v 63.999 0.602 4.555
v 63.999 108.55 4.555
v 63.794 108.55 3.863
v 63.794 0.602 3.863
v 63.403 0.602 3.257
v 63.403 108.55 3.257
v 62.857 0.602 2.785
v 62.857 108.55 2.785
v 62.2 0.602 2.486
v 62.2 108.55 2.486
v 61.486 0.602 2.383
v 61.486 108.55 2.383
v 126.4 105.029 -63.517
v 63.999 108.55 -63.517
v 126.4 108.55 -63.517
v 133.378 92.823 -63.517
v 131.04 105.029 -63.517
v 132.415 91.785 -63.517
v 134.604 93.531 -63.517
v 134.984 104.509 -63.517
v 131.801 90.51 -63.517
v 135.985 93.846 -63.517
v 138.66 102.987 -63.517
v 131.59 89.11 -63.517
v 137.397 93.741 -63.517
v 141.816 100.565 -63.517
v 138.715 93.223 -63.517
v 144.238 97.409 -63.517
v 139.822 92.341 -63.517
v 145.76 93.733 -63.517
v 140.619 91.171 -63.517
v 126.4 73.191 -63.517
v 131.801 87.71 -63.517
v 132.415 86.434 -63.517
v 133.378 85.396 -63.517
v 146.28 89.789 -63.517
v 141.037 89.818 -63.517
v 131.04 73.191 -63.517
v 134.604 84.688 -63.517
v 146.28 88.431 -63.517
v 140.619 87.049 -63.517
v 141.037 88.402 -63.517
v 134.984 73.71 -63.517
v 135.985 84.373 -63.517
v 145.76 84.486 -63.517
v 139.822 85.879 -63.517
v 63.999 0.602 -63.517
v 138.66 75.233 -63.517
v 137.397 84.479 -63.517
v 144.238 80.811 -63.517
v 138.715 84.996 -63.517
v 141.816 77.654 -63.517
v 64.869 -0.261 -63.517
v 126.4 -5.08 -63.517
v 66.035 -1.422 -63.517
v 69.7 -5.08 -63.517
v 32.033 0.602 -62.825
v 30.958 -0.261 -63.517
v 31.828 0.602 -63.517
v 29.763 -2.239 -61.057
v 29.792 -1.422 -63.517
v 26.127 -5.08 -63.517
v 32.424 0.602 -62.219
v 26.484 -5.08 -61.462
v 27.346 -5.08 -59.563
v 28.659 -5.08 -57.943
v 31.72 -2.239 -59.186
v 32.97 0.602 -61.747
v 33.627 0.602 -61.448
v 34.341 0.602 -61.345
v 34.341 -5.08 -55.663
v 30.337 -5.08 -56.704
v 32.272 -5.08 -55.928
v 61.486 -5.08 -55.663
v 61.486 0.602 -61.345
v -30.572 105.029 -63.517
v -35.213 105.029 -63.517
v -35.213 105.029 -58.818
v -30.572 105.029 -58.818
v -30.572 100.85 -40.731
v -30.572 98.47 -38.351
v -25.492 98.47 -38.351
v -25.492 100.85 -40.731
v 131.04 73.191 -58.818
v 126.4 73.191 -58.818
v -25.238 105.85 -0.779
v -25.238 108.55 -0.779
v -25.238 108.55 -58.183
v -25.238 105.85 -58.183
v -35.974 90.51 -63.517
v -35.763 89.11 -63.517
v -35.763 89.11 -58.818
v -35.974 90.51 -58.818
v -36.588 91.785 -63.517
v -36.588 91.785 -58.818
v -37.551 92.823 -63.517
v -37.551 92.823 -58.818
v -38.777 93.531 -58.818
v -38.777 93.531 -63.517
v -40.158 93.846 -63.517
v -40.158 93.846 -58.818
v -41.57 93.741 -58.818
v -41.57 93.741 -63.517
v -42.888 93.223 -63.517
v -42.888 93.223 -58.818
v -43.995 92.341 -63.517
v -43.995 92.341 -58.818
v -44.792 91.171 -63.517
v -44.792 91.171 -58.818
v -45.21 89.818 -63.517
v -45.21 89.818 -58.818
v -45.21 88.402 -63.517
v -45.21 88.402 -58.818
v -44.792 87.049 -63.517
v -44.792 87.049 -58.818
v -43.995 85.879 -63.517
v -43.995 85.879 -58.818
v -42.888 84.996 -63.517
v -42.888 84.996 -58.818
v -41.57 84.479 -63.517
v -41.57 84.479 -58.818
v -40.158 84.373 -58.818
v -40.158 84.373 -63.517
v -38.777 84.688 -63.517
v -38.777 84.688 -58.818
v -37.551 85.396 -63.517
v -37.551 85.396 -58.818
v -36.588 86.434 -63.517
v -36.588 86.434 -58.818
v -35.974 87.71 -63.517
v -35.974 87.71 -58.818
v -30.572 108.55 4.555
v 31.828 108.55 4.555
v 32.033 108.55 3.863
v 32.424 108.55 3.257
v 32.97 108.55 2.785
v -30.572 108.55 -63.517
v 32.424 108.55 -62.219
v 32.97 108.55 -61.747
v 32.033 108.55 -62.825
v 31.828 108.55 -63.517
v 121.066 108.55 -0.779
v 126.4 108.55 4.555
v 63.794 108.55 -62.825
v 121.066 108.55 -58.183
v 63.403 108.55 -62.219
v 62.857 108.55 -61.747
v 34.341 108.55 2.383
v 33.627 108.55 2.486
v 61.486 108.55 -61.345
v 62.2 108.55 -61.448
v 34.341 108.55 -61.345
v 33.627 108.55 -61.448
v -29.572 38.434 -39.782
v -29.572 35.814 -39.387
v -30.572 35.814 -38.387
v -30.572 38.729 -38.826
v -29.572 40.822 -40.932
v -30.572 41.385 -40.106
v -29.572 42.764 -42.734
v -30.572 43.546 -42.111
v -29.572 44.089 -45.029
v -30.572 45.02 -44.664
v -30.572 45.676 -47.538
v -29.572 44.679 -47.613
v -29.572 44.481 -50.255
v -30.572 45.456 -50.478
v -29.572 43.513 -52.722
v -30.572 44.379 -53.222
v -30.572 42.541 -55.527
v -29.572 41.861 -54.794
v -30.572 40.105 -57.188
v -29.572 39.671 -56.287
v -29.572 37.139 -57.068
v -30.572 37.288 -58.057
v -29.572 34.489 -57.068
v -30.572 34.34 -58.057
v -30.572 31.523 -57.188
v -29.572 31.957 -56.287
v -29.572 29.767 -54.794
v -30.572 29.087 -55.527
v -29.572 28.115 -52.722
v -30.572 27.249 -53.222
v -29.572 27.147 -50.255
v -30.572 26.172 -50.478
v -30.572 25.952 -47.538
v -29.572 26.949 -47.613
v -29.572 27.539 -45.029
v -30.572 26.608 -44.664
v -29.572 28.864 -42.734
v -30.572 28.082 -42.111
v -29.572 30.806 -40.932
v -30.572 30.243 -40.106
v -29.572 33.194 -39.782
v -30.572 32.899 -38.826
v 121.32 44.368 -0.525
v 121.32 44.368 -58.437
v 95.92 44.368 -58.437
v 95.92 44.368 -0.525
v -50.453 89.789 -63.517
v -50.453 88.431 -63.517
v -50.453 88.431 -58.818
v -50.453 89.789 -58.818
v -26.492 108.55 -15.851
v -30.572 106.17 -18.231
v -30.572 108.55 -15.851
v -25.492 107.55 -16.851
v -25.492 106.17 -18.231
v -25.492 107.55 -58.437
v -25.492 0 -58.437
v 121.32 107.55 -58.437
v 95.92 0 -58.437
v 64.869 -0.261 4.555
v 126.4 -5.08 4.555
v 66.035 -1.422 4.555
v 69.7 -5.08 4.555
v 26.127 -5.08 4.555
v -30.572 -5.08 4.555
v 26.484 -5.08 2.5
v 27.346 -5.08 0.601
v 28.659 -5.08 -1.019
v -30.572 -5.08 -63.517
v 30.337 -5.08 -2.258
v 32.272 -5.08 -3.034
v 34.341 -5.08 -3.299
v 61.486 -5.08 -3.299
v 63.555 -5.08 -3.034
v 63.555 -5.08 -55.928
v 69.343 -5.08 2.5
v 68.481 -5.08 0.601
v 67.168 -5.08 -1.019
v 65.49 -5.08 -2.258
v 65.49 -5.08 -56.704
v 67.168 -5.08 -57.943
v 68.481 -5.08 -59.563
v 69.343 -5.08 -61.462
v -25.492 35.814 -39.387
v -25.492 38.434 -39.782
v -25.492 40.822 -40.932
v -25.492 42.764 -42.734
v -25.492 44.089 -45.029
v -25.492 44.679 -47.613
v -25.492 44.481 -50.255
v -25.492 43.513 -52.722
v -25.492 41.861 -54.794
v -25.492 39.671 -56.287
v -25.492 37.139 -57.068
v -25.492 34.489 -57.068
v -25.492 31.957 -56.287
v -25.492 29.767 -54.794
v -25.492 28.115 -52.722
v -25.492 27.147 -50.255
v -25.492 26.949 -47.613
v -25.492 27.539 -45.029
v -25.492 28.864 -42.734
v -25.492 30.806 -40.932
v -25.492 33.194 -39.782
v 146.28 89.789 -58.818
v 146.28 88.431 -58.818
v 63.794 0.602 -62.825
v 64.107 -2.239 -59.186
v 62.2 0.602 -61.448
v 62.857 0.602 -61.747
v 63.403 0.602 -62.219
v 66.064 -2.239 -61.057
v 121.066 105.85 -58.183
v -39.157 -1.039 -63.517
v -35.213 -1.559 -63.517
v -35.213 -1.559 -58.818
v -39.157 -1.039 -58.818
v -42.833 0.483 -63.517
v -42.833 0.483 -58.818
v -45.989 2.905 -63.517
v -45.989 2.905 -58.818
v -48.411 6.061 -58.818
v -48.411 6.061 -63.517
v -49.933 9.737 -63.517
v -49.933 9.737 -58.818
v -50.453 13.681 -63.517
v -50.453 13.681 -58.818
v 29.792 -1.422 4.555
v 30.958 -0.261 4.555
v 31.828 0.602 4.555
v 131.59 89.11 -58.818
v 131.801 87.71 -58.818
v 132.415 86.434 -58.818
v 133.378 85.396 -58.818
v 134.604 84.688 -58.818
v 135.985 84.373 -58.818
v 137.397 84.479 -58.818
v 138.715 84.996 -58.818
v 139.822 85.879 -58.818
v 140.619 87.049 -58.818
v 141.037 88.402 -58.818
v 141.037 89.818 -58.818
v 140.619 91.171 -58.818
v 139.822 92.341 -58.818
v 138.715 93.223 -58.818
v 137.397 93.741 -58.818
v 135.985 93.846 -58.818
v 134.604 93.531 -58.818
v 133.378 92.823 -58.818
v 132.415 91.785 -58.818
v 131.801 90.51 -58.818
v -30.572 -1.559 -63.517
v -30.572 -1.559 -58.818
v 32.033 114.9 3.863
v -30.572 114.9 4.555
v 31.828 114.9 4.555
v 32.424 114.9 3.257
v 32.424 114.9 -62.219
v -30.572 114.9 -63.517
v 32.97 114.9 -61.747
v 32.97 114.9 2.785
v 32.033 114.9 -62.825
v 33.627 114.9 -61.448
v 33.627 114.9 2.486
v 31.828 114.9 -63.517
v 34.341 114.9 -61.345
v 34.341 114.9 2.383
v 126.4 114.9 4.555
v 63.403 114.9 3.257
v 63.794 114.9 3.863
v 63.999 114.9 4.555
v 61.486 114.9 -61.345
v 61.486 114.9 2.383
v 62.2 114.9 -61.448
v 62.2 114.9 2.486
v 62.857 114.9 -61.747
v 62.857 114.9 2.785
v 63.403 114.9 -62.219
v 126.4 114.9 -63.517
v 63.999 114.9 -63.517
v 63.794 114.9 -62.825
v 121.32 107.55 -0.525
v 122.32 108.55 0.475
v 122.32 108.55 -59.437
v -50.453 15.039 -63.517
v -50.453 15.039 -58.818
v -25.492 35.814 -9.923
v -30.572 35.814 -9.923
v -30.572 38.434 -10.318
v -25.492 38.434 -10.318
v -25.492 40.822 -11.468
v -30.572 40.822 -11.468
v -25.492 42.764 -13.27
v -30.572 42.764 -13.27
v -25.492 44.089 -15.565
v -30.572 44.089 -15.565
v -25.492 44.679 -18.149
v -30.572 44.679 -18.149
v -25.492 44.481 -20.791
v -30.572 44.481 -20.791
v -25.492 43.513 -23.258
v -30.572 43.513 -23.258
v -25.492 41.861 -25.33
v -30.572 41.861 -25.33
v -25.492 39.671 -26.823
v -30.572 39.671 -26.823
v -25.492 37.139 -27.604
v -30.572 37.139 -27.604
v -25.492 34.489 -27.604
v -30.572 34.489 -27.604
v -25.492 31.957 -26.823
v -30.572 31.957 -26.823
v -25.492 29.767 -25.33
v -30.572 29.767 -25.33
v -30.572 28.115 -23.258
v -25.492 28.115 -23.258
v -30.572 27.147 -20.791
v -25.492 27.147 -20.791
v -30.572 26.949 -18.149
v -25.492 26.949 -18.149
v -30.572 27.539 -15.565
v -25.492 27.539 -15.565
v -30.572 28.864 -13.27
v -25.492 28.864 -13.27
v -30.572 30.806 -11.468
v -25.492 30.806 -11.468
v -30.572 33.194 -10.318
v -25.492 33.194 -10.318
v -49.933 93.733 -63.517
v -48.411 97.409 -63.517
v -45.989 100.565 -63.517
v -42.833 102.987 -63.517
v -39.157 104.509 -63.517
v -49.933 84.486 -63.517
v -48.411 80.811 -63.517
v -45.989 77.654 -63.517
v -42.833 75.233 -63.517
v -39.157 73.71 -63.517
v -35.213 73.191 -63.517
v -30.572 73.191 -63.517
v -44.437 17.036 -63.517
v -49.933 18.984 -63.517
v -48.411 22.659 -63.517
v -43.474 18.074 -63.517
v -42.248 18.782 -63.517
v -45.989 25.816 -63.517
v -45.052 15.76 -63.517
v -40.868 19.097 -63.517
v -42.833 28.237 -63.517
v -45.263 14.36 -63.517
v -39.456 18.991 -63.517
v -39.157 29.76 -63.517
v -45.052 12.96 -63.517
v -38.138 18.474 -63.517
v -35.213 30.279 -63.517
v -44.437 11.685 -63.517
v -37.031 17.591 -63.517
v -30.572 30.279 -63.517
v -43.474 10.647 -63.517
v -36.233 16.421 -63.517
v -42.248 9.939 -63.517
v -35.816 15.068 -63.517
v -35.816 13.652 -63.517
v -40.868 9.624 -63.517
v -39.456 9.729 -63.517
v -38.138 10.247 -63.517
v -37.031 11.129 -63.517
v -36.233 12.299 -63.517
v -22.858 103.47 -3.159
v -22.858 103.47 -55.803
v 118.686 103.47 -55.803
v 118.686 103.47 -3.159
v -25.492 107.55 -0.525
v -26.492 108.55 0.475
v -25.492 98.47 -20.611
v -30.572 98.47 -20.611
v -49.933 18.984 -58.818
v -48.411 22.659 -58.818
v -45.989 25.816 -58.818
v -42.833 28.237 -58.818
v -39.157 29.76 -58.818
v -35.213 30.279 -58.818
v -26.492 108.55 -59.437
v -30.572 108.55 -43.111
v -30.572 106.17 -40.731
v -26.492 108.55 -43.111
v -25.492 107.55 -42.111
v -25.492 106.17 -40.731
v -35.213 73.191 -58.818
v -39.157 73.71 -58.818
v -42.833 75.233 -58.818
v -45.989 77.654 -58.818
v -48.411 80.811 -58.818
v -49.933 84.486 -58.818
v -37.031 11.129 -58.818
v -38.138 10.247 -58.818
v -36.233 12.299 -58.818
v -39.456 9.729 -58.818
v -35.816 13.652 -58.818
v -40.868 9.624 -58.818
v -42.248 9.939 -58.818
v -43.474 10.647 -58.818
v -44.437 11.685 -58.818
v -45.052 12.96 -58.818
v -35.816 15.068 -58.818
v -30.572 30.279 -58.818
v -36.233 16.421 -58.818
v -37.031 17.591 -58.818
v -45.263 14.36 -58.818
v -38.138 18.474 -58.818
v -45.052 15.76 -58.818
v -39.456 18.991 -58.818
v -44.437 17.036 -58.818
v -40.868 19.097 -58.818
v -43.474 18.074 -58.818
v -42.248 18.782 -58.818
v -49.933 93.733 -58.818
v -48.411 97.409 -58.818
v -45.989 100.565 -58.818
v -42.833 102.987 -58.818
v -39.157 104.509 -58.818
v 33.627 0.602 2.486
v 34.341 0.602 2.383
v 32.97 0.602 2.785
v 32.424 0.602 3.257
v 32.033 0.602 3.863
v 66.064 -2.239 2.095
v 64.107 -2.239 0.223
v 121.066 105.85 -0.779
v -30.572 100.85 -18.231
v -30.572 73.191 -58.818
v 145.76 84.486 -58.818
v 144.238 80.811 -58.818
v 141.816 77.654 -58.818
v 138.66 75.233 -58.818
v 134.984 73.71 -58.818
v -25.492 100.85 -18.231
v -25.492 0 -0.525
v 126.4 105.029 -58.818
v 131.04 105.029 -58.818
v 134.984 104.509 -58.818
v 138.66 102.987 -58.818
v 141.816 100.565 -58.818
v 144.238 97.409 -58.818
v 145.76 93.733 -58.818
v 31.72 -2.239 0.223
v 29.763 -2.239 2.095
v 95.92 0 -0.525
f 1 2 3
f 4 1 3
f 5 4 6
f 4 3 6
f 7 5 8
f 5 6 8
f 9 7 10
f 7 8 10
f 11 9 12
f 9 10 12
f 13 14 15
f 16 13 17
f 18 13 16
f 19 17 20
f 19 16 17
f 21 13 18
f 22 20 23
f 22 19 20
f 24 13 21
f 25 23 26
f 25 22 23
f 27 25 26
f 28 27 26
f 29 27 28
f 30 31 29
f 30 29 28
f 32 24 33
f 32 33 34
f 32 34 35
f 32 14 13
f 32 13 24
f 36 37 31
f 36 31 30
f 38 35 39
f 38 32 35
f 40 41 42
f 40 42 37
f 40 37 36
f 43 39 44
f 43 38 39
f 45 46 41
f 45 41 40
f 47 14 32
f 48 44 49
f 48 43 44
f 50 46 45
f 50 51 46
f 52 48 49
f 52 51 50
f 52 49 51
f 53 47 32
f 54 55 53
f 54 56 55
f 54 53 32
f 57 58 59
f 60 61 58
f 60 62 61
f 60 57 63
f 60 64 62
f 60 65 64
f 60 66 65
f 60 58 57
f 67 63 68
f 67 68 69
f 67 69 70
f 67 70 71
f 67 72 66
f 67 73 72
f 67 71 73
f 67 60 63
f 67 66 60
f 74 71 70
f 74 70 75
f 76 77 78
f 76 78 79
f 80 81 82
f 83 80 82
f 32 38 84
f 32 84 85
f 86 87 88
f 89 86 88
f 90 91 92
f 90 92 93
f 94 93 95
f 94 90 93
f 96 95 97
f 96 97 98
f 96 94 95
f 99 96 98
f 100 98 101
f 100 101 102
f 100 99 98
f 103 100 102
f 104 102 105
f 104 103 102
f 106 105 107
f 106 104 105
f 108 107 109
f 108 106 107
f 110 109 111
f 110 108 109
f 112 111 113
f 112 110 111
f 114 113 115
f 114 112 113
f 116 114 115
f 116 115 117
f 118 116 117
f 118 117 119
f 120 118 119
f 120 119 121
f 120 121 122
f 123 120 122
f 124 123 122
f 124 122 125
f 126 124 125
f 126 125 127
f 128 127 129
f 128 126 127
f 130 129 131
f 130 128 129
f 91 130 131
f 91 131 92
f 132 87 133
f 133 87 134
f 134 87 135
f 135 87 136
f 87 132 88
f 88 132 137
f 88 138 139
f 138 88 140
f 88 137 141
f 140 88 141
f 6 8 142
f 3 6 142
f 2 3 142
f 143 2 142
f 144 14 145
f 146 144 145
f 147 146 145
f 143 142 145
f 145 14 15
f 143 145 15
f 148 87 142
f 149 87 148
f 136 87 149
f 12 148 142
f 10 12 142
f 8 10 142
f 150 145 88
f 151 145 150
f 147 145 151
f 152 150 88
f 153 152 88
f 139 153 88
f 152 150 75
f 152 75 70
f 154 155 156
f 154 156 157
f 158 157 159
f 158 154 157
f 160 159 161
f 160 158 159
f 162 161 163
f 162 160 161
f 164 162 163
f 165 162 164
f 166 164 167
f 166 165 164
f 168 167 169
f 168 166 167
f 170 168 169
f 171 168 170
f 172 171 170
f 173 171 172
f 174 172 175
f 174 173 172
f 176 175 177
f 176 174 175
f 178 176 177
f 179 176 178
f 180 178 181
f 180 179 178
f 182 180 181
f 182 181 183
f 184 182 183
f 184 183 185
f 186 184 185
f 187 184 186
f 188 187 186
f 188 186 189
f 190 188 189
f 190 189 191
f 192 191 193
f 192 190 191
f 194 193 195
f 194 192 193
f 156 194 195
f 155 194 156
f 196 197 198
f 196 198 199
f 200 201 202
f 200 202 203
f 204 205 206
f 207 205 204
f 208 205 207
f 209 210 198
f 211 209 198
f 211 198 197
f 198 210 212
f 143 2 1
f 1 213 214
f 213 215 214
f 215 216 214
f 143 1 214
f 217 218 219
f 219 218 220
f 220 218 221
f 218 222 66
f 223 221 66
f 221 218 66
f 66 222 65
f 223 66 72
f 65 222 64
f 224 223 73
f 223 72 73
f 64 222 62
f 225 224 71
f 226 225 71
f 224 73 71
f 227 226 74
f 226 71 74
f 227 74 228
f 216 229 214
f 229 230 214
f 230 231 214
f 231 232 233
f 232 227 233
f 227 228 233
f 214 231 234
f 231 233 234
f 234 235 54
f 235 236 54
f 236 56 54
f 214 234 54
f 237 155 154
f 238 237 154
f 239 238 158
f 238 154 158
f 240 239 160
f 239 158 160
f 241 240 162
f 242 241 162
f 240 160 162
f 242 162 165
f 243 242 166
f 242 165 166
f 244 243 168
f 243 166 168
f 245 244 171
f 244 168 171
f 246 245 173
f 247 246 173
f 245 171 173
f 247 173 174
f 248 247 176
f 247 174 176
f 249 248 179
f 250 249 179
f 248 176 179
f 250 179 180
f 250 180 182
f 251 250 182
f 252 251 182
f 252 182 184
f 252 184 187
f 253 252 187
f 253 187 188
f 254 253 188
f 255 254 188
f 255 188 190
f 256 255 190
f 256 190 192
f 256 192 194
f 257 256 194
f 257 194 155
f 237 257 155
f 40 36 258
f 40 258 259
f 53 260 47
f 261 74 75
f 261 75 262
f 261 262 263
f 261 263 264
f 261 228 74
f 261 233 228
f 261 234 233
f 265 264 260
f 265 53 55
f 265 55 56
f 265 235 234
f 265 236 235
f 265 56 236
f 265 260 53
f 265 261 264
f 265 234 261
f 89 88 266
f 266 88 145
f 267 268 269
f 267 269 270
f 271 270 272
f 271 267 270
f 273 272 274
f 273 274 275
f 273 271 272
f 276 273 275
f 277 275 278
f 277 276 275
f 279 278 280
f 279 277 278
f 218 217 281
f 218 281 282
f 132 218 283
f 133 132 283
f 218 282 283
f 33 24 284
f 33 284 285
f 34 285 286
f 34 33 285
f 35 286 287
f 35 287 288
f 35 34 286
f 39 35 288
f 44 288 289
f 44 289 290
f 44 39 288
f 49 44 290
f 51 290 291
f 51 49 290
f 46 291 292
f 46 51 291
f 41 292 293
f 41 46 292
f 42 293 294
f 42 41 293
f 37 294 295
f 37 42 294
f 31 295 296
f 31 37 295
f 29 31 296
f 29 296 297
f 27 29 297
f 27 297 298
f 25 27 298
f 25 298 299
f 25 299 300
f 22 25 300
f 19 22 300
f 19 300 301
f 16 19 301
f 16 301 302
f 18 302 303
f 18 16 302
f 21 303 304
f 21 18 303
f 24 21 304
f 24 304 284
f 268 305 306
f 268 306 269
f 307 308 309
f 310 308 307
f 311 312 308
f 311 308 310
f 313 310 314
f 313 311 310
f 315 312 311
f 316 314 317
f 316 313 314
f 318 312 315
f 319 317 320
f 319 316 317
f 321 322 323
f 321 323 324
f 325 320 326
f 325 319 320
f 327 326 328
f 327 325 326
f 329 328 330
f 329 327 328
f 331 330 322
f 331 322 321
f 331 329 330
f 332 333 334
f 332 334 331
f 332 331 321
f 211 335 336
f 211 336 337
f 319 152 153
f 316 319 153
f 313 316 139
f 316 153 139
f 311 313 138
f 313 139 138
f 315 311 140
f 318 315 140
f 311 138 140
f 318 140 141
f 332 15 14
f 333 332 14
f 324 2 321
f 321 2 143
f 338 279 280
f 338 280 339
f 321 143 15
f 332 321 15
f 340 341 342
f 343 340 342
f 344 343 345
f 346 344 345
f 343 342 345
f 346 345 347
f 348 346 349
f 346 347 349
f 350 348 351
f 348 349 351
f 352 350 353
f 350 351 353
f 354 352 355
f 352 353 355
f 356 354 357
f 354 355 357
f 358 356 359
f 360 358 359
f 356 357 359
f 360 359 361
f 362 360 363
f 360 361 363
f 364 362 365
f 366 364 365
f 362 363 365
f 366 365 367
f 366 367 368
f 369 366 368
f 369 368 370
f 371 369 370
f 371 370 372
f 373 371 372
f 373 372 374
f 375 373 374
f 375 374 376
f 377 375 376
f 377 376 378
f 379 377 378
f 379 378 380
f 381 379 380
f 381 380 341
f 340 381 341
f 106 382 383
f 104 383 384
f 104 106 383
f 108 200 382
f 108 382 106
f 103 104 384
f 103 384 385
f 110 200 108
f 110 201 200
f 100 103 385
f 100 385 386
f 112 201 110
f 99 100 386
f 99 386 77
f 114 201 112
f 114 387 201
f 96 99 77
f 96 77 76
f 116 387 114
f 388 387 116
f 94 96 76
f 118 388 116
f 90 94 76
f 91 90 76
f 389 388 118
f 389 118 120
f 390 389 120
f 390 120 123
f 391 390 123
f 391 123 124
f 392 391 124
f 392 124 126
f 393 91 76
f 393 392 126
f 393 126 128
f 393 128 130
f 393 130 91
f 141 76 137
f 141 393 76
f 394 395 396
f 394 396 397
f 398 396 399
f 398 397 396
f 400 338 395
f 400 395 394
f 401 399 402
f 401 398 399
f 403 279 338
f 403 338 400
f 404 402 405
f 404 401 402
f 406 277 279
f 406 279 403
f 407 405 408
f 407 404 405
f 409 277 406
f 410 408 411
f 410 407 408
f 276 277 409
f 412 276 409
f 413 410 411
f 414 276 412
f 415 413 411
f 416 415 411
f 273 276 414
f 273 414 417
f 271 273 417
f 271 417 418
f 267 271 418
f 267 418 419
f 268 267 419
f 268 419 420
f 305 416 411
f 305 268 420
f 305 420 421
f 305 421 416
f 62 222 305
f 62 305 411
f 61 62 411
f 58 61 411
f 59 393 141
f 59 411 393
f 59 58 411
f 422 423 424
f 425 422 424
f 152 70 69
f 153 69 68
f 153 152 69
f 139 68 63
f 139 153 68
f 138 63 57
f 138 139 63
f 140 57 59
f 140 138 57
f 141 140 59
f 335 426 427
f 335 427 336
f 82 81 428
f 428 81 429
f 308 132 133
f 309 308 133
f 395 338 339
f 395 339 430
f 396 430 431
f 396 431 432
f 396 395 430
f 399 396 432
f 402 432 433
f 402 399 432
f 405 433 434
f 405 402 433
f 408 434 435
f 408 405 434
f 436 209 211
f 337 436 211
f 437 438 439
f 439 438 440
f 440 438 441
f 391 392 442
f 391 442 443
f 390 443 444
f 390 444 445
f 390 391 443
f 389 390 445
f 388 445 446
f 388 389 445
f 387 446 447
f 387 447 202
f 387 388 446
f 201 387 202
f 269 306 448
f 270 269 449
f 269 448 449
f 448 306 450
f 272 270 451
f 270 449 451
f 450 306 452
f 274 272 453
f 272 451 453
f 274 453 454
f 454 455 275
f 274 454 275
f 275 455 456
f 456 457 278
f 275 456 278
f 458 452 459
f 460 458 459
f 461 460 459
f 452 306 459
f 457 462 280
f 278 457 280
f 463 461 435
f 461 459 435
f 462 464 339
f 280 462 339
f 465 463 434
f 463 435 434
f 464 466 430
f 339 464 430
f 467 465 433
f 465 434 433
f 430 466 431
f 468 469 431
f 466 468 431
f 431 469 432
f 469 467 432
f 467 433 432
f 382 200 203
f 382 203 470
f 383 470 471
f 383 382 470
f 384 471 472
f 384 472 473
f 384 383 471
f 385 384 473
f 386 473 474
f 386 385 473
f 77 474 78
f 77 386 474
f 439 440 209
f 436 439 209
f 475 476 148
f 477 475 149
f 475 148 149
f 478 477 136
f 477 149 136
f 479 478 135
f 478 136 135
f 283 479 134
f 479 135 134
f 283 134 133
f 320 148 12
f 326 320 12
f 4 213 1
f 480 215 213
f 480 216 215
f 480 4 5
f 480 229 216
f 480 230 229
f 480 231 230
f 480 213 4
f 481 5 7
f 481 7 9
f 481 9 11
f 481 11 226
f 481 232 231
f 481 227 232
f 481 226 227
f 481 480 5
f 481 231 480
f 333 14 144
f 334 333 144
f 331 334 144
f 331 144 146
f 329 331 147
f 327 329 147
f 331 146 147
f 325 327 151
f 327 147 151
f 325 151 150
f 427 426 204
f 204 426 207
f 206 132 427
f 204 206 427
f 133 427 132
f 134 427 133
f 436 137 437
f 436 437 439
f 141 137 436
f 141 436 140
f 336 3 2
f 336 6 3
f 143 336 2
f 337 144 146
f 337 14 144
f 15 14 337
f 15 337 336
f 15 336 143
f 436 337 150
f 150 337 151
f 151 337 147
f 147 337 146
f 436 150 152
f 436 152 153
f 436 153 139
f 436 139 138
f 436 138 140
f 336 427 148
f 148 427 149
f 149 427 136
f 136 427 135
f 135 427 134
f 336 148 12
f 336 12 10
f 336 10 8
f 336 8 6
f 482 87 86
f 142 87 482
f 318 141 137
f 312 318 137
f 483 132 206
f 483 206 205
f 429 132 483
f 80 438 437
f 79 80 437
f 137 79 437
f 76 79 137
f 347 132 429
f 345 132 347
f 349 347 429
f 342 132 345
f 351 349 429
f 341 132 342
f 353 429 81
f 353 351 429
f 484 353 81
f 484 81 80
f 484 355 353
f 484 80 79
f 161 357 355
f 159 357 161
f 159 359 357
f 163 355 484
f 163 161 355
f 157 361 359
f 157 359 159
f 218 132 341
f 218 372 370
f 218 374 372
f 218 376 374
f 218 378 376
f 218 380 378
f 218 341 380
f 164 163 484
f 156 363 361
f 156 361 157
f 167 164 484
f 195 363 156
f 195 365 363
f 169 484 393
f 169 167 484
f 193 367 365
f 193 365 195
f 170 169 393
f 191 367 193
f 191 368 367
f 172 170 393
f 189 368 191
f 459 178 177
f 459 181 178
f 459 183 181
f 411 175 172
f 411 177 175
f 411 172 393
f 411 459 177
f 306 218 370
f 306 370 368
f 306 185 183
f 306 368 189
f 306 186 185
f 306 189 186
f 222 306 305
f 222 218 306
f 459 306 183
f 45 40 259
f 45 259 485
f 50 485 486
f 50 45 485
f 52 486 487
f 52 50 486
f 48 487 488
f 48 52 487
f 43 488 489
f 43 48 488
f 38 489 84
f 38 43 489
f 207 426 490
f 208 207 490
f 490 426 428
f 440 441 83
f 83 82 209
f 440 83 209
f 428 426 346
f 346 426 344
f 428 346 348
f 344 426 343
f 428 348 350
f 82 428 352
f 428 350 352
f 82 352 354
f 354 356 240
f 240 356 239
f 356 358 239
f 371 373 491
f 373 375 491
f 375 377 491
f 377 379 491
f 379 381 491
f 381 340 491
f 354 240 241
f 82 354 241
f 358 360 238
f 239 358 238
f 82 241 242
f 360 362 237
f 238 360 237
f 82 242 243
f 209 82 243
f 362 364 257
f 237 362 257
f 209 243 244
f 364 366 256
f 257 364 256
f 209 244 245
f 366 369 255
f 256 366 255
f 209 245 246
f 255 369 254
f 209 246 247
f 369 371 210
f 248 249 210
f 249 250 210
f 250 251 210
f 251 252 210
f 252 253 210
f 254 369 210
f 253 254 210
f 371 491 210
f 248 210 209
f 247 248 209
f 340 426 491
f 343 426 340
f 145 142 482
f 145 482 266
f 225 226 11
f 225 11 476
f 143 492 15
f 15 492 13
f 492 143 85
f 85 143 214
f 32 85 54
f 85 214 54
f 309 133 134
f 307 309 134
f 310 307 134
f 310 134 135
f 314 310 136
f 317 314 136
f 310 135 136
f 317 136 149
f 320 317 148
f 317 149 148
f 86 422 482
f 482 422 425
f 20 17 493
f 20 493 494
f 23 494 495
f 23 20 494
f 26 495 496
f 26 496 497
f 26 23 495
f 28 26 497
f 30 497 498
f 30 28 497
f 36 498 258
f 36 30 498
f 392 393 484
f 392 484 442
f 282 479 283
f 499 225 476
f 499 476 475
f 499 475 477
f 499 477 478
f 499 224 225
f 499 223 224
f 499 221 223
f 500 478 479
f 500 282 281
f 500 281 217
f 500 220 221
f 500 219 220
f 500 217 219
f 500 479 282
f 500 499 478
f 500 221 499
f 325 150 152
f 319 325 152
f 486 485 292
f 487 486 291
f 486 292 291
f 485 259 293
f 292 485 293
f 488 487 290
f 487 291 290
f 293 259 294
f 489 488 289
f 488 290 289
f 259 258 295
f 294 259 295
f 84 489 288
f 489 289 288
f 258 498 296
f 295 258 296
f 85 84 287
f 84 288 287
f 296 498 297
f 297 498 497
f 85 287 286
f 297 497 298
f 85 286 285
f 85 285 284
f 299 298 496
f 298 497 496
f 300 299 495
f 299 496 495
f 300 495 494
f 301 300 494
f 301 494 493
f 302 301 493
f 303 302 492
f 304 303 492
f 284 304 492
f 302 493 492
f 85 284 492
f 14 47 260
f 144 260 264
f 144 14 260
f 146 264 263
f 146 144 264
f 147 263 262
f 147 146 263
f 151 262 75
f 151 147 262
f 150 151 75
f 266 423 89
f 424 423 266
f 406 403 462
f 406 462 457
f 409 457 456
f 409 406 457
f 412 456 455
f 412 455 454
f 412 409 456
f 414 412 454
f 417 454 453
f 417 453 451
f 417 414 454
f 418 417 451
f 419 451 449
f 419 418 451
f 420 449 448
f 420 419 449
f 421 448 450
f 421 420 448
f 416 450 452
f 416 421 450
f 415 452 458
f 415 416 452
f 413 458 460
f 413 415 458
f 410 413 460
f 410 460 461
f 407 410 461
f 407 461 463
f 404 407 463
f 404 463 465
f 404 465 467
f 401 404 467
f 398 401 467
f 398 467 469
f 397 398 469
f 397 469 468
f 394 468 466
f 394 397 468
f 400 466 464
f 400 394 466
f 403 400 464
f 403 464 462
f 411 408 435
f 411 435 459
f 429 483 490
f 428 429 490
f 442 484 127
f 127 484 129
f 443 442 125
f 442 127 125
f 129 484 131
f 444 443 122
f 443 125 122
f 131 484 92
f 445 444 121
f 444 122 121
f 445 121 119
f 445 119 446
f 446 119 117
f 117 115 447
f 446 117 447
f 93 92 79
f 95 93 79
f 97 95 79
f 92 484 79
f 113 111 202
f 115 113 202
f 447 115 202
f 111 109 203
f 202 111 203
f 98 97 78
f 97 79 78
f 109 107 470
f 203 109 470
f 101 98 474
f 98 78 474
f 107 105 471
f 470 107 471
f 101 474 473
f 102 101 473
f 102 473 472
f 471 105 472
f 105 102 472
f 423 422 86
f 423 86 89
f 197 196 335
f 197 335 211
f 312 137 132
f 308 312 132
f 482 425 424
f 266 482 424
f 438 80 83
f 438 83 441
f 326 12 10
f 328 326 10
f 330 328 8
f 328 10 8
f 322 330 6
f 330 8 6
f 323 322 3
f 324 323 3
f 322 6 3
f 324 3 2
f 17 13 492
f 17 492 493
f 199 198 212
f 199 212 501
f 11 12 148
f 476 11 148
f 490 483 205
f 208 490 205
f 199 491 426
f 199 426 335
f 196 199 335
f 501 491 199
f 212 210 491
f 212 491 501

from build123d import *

# Parameters (mm, degrees)
SKETCH1_W               = 146.812
SKETCH1_H               = 57.912
BOSS_EXTRUDE1_DEPTH     = 108.55000007
SHELL1_T                = 5.08
CUT_EXTRUDE1_REACH      = 203.141
SKETCH2_R               = 8.89
CUT_EXTRUDE4_DEPTH      = 187.572089224
CUT_EXTRUDE4_DEPTH_BACK = 187.572089224
CHAMFER1_SIZE           = 5.682000066
BOSS_EXTRUDE2_DEPTH     = 6.35
SKETCH4_5_W             = 146.304
SKETCH4_5_H             = 57.404
BOSS_EXTRUDE3_DEPTH     = 5.08
CHAMFER2_SIZE           = 2.38
CHAMFER4_SIZE           = 1
CHAMFER5_SIZE           = 1
SKETCH6_W               = 22.5
SKETCH6_H               = 20.16
CUT_EXTRUDE6_DEPTH      = 5.08
CHAMFER6_SIZE           = 2.38
SKETCH8_R               = 4.75
BOSS_EXTRUDE4_DEPTH     = 4.699
SKETCH10_R              = 8.89
CUT_EXTRUDE10_DEPTH     = 25.4
SKETCH14_W              = 58.978157653
SKETCH14_H              = 44.368020442
BOSS_EXTRUDE7_DEPTH     = 25.4


with BuildPart() as part:
    # Sketch1 → Boss-Extrude1 (new body)
    with BuildSketch(Plane(origin=(0, 0, 0), x_dir=(1, 0, 0), z_dir=(0, 1, 0))):
        with Locations((47.913535633, 29.481052451)):
            Rectangle(SKETCH1_W, SKETCH1_H)
    extrude(amount=BOSS_EXTRUDE1_DEPTH)

    # Shell1
    shell1_openings = [part.faces().sort_by_distance(p)[0] for p in [
        (47.913535633, 108.55000007, -29.481052451),
    ]]
    offset(amount=SHELL1_T, openings=shell1_openings, kind=Kind.INTERSECTION)

    # Sketch2 → Cut-Extrude1 (cut, up to next)
    with BuildSketch(Plane.ZY.offset(30.572464367), mode=Mode.PRIVATE) as cut_extrude1_sk1:
        with Locations((-48.277052451, 35.814)):
            Circle(SKETCH2_R)
    cut_extrude1_tool1 = extrude(cut_extrude1_sk1.sketch, amount=-CUT_EXTRUDE1_REACH, mode=Mode.PRIVATE) & part.part
    add(cut_extrude1_tool1.solids().sort_by_distance((-30.572464, 35.814, -48.277052))[0], mode=Mode.SUBTRACT)

    # Sketch3 → Cut-Extrude4 (cut, two sides: drawn at the far end of the back side and taken through both)
    with BuildSketch(Plane(origin=(0, 108.55000007, -72.39), x_dir=(1, 0, 0), z_dir=(0, -1, 0)).offset(-CUT_EXTRUDE4_DEPTH_BACK)):
        with BuildLine():
            Line((31.800898604, 8.504686505), (31.800898604, 0.374266878))
            Line((31.800898604, 0.374266878), (64.026172661, 0.374266878))
            Line((64.026172661, 0.374266878), (64.026172661, 8.504686505))
            ThreePointArc((64.026172661, 8.504686505), (63.282223886, 10.300737729), (61.486172661, 11.044686505))
            Line((61.486172661, 11.044686505), (34.340898604, 11.044686505))
            ThreePointArc((34.340898604, 11.044686505), (32.54484738, 10.300737729), (31.800898604, 8.504686505))
        make_face()
        with BuildLine():
            Line((31.800898604, 85.44362822), (64.026172661, 85.44362822))
            Line((64.026172661, 85.44362822), (64.026172661, 77.313208593))
            ThreePointArc((64.026172661, 77.313208593), (63.282223886, 75.517157369), (61.486172661, 74.773208593))
            Line((61.486172661, 74.773208593), (34.340898604, 74.773208593))
            ThreePointArc((34.340898604, 74.773208593), (32.54484738, 75.517157369), (31.800898604, 77.313208593))
            Line((31.800898604, 77.313208593), (31.800898604, 85.44362822))
        make_face()
    extrude(amount=CUT_EXTRUDE4_DEPTH + CUT_EXTRUDE4_DEPTH_BACK, mode=Mode.SUBTRACT)

    # Chamfer1
    chamfer1_edges = [part.edges().sort_by_distance(p)[0] for p in [
        (32.680143211, -5.08, 3.001362729),
        (63.146928054, -5.08, -61.963467631),
        (47.913535633, -5.08, -61.345313495),
        (32.680143211, -5.08, -61.963467631),
        (47.913535633, -5.08, 2.383208593),
        (63.146928054, -5.08, 3.001362729),
    ]]
    chamfer(chamfer1_edges, length=CHAMFER1_SIZE)

    # Chamfer4
    chamfer4_edges = [part.edges().sort_by_distance(p)[0] for p in [
        (121.319535633, 108.55000007, -29.481052451),
        (47.913535633, 108.55000007, -58.437052451),
        (47.913535633, 108.55000007, -0.525052451),
        (-25.492464367, 108.55000007, -29.481052451),
    ]]
    chamfer(chamfer4_edges, length=CHAMFER4_SIZE)

    # Chamfer5
    chamfer5_edges = [part.edges().sort_by_distance(p)[0] for p in [
        (-30.572464367, 35.814, -57.167052451),
    ]]
    chamfer(chamfer5_edges, length=CHAMFER5_SIZE)

    # Sketch6 → Cut-Extrude6 (cut)
    with BuildSketch(Plane.ZY.offset(30.572464367)):
        with Locations((-29.481052451, 108.55000007)):
            Rectangle(SKETCH6_W, SKETCH6_H)
    extrude(amount=-CUT_EXTRUDE6_DEPTH, mode=Mode.SUBTRACT)

    # Chamfer6
    chamfer6_edges = [part.edges().sort_by_distance(p)[0] for p in [
        (-28.532464367, 108.55000007, -18.231052451),
        (-28.032464367, 98.47000007, -18.231052451),
        (-28.032464367, 98.47000007, -40.731052451),
        (-28.532464367, 108.55000007, -40.731052451),
    ]]
    chamfer(chamfer6_edges, length=CHAMFER6_SIZE)

    # Sketch8 → Boss-Extrude4 (add)
    # profile 1 of 3: a face of its own
    with BuildSketch(Plane(origin=(0, -31.597052283, -63.517052451), x_dir=(1, 0, 0), z_dir=(0, 0, 1))):
        with BuildLine():
            Line((-50.452696683, 120.027791223), (-50.452696716, 121.385755516))
            ThreePointArc((-50.452696716, 121.385755516), (-45.989005942, 132.162061359), (-35.212701658, 136.625755894))
            Line((-35.212701658, 136.625755894), (-30.572464367, 136.625757399))
            Line((-30.572464367, 136.625757399), (-30.572464367, 104.787793105))
            Line((-30.572464367, 104.787793105), (-35.212691741, 104.787791601))
            ThreePointArc((-35.212691741, 104.787791601), (-45.989002147, 109.251482375), (-50.452696683, 120.027791223))
        make_face()
        with Locations((-40.512580533, 120.706771713)):
            Circle(SKETCH8_R, mode=Mode.SUBTRACT)
    # profile 2 of 3: a face of its own
    with BuildSketch(Plane(origin=(0, -31.597052283, -63.517052451), x_dir=(1, 0, 0), z_dir=(0, 0, 1))):
        with BuildLine():
            Line((-30.572464367, 61.876311531), (-30.572464367, 30.038347237))
            Line((-30.572464367, 30.038347237), (-35.212701658, 30.038348742))
            ThreePointArc((-35.212701658, 30.038348742), (-45.989005942, 34.502043277), (-50.452696716, 45.27834912))
            Line((-50.452696716, 45.27834912), (-50.452696683, 46.636313414))
            ThreePointArc((-50.452696683, 46.636313414), (-45.989002147, 57.412622262), (-35.212691741, 61.876313036))
            Line((-35.212691741, 61.876313036), (-30.572464367, 61.876311531))
        make_face()
        with Locations(Location((-40.512580533, 45.957332923, 0), (0, 0, 180))):
            Circle(SKETCH8_R, mode=Mode.SUBTRACT)
    # profile 3 of 3: a face of its own
    with BuildSketch(Plane(origin=(0, -31.597052283, -63.517052451), x_dir=(1, 0, 0), z_dir=(0, 0, 1))):
        with BuildLine():
            Line((126.399535633, 104.787793105), (126.399535633, 136.625757399))
            Line((126.399535633, 136.625757399), (131.039772923, 136.625755894))
            ThreePointArc((131.039772923, 136.625755894), (141.816077208, 132.162061359), (146.279767981, 121.385755516))
            Line((146.279767981, 121.385755516), (146.279767948, 120.027791223))
            ThreePointArc((146.279767948, 120.027791223), (141.816073412, 109.251482375), (131.039763006, 104.787791601))
            Line((131.039763006, 104.787791601), (126.399535633, 104.787793105))
        make_face()
        with Locations(Location((136.339651799, 120.706771713, 0), (0, 0, 180))):
            Circle(SKETCH8_R, mode=Mode.SUBTRACT)
    extrude(amount=BOSS_EXTRUDE4_DEPTH)

    # Sketch10 → Cut-Extrude10 (cut)
    with BuildSketch(Plane.ZY.offset(30.572464367)):
        with Locations((-18.813052451, 35.814)):
            Circle(SKETCH10_R)
    extrude(amount=-CUT_EXTRUDE10_DEPTH, mode=Mode.SUBTRACT)

    # Sketch14 → Boss-Extrude7 (add)
    with BuildSketch(Plane.ZY.offset(-121.319535633)):
        with Locations((-29.489078827, 22.184010221)):
            Rectangle(SKETCH14_W, SKETCH14_H)
    extrude(amount=BOSS_EXTRUDE7_DEPTH)


with BuildPart() as body_2:
    # Sketch4 → Boss-Extrude2 (new body)
    with BuildSketch(Plane(origin=(0, 108.55000007, 0), x_dir=(1, 0, 0), z_dir=(0, 1, 0))):
        with BuildLine():
            Line((31.827736491, 63.517052451), (-30.572464367, 63.517052451))
            Line((-30.572464367, 63.517052451), (-30.572464367, -4.554947549))
            Line((-30.572464367, -4.554947549), (31.827736491, -4.554947549))
            ThreePointArc((31.827736491, -4.554947549), (32.680143211, -3.001362729), (34.340898604, -2.383208593))
            Line((34.340898604, -2.383208593), (61.486172661, -2.383208593))
            ThreePointArc((61.486172661, -2.383208593), (63.146928054, -3.001362729), (63.999334774, -4.554947549))
            Line((63.999334774, -4.554947549), (126.399535633, -4.554947549))
            Line((126.399535633, -4.554947549), (126.399535633, 63.517052451))
            Line((126.399535633, 63.517052451), (63.999334774, 63.517052451))
            ThreePointArc((63.999334774, 63.517052451), (63.146928054, 61.963467631), (61.486172661, 61.345313495))
            Line((61.486172661, 61.345313495), (34.340898604, 61.345313495))
            ThreePointArc((34.340898604, 61.345313495), (32.680143211, 61.963467631), (31.827736491, 63.517052451))
        make_face()
    extrude(amount=BOSS_EXTRUDE2_DEPTH)

    # Sketch4<5> → Boss-Extrude3 (add)
    with BuildSketch(Plane(origin=(0, 108.55000007, 0), x_dir=(1, 0, 0), z_dir=(0, 1, 0))):
        with Locations((47.913535633, 29.481052451)):
            Rectangle(SKETCH4_5_W, SKETCH4_5_H)
    extrude(amount=-BOSS_EXTRUDE3_DEPTH)

    # Chamfer2
    chamfer2_edges = [body_2.edges().sort_by_distance(p)[0] for p in [
        (121.065535633, 103.47000007, -29.481052451),
        (47.913535633, 103.47000007, -0.779052451),
        (-25.238464367, 103.47000007, -29.481052451),
        (47.913535633, 103.47000007, -58.183052451),
    ]]
    chamfer(chamfer2_edges, length=CHAMFER2_SIZE)


solid = Compound([part.part, body_2.part])
